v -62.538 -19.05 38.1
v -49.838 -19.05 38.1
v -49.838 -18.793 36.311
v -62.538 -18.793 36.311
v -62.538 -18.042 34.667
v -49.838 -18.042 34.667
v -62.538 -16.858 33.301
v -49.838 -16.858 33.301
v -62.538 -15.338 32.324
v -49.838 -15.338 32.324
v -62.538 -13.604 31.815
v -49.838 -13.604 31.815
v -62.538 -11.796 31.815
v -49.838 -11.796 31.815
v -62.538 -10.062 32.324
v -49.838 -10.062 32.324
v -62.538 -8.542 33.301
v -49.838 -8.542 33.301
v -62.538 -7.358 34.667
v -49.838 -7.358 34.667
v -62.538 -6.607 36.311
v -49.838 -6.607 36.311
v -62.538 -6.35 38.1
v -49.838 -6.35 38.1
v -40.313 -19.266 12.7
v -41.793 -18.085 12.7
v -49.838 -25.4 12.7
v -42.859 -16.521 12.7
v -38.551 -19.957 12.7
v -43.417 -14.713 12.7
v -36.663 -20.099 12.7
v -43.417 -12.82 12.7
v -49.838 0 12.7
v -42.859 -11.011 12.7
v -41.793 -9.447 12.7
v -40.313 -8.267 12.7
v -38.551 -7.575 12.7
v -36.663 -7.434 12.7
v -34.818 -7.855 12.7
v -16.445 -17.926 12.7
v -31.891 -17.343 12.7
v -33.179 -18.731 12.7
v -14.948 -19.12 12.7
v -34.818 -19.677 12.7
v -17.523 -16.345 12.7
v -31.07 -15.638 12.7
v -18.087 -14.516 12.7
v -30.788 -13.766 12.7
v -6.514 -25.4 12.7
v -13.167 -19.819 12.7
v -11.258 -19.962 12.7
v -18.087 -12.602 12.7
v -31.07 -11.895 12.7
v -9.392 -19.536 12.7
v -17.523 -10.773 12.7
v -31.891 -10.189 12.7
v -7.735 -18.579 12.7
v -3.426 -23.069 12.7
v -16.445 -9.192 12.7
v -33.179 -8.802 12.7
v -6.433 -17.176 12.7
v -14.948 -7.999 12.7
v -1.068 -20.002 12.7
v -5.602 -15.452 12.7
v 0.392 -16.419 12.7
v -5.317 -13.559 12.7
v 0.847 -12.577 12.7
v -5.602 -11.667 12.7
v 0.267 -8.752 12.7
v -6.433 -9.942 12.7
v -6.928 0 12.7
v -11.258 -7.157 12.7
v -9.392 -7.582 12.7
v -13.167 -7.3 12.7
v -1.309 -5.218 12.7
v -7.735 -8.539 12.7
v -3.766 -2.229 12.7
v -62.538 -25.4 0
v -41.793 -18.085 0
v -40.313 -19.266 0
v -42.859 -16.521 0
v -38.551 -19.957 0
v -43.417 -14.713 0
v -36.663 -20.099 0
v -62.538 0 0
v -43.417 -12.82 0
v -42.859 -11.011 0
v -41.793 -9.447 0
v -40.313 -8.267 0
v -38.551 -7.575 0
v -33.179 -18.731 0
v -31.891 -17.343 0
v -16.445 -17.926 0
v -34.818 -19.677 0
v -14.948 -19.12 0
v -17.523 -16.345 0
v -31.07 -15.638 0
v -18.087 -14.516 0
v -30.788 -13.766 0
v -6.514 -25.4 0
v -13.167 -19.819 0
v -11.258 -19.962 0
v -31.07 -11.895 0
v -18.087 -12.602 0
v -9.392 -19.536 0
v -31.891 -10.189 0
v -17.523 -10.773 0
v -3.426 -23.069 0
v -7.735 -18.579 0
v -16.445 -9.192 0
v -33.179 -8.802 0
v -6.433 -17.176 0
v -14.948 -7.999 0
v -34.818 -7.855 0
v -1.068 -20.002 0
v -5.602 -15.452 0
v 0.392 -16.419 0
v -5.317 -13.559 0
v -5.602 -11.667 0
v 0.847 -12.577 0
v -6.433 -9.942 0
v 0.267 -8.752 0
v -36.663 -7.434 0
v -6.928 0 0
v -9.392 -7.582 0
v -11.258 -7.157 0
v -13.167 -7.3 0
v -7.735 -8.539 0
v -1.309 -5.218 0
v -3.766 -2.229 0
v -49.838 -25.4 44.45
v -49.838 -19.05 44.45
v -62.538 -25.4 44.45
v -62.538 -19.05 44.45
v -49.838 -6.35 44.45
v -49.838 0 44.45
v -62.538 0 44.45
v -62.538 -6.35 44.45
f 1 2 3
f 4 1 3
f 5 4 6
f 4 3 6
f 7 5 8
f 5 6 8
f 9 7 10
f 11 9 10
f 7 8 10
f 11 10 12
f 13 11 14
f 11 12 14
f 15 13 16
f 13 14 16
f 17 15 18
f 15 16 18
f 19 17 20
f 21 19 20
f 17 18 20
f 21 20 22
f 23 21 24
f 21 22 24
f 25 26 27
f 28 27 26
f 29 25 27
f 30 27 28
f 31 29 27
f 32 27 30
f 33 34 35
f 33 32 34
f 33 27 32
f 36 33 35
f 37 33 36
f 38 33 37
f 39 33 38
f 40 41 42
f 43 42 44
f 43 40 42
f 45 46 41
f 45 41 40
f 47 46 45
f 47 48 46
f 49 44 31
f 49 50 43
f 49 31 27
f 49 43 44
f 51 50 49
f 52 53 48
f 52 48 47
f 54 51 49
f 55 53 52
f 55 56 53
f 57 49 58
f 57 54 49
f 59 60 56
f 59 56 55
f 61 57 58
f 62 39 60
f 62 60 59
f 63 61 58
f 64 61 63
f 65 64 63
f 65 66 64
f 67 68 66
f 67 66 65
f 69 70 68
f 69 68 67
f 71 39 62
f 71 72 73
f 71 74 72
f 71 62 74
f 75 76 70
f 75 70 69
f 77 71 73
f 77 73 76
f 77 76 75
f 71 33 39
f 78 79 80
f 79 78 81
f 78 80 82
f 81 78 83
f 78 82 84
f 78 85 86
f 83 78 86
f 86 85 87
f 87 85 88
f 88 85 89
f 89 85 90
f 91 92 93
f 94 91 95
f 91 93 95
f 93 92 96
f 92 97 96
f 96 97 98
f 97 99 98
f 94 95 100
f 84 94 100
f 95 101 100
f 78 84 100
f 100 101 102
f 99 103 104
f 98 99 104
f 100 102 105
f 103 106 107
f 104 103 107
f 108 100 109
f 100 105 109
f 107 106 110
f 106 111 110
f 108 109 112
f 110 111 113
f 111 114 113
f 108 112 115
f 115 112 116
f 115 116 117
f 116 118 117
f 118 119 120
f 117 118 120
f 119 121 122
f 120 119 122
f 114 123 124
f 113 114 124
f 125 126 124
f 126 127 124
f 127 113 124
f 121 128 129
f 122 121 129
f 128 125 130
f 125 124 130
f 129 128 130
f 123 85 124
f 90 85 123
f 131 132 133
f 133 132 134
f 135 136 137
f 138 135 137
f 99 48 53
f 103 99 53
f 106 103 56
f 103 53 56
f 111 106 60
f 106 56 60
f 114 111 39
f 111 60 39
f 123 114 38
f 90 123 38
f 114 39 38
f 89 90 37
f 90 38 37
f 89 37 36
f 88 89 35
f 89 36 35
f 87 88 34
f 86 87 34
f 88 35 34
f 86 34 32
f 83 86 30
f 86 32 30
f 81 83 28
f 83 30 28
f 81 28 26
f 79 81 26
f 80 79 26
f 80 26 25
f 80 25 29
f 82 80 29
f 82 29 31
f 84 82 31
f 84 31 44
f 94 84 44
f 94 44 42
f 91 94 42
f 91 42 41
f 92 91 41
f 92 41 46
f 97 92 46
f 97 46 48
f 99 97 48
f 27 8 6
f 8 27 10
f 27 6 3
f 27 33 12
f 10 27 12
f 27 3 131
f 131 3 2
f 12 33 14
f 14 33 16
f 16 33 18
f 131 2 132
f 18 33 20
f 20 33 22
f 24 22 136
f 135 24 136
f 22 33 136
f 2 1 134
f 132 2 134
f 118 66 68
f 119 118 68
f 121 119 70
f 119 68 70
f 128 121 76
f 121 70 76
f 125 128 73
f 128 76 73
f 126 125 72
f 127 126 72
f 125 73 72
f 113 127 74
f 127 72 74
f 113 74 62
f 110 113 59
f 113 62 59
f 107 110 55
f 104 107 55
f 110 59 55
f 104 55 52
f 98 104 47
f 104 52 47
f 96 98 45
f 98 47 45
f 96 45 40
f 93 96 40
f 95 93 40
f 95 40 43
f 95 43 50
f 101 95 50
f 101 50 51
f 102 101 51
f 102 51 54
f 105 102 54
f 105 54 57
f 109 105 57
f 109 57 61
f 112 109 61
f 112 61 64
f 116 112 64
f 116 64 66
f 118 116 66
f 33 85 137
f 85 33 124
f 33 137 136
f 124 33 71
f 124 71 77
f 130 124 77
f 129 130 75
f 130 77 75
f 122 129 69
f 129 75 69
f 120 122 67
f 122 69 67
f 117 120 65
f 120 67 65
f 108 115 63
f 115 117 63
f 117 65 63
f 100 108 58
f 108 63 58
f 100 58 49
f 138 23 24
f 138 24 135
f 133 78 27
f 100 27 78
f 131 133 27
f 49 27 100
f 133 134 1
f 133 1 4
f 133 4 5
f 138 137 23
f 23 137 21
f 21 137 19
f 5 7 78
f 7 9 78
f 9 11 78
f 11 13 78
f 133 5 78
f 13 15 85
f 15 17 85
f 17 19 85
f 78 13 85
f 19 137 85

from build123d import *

# Parameters (mm, degrees)
F0_W     = 50.8
F0_H     = 12.7
F1_DEPTH = 25.4
F2_W     = 12.7
F2_H     = 6.35
F3_DEPTH = 25.4
F4_R     = 6.35
F4_R_2   = 6.420699
F5_DEPTH = 25.4


with BuildPart() as f1:
    # F0 (on Front) → F1 (new body)
    with BuildSketch(Plane.XZ):
        Polygon((-62.537882, 44.45), (-62.537882, 0), (-49.837882, 0), (-49.837882, 12.7), (-49.837882, 44.45), align=None)
        with Locations((-24.437882, 6.35)):
            Rectangle(F0_W, F0_H)
    extrude(amount=F1_DEPTH)

    # F2 (on face) → F3 (cut)
    with BuildSketch(Plane.YZ.offset(-49.837882)):
        with Locations((-12.7, 41.275)):
            Rectangle(F2_W, F2_H)
        with BuildLine():
            Line((-6.35, 38.1), (-19.05, 38.1))
            ThreePointArc((-19.05, 38.1), (-12.7, 31.75), (-6.35, 38.1))
        make_face()
    extrude(amount=-F3_DEPTH, mode=Mode.SUBTRACT)

    # F4 (on face) → F5 (cut)
    with BuildSketch(Plane.XY.offset(12.7)):
        with Locations((-37.137882, -13.766274)):
            Circle(F4_R)
        with Locations((-11.737882, -13.559262)):
            Circle(F4_R_2)
        with BuildLine():
            ThreePointArc((-6.927767, 0), (0.847206, -12.576641), (-6.513743, -25.4))
            Line((-6.513743, -25.4), (0.962118, -25.4))
            Line((0.962118, -25.4), (0.962118, 0))
            Line((0.962118, 0), (-6.927767, 0))
        make_face()
    extrude(amount=-F5_DEPTH, mode=Mode.SUBTRACT)


solid = f1.part
